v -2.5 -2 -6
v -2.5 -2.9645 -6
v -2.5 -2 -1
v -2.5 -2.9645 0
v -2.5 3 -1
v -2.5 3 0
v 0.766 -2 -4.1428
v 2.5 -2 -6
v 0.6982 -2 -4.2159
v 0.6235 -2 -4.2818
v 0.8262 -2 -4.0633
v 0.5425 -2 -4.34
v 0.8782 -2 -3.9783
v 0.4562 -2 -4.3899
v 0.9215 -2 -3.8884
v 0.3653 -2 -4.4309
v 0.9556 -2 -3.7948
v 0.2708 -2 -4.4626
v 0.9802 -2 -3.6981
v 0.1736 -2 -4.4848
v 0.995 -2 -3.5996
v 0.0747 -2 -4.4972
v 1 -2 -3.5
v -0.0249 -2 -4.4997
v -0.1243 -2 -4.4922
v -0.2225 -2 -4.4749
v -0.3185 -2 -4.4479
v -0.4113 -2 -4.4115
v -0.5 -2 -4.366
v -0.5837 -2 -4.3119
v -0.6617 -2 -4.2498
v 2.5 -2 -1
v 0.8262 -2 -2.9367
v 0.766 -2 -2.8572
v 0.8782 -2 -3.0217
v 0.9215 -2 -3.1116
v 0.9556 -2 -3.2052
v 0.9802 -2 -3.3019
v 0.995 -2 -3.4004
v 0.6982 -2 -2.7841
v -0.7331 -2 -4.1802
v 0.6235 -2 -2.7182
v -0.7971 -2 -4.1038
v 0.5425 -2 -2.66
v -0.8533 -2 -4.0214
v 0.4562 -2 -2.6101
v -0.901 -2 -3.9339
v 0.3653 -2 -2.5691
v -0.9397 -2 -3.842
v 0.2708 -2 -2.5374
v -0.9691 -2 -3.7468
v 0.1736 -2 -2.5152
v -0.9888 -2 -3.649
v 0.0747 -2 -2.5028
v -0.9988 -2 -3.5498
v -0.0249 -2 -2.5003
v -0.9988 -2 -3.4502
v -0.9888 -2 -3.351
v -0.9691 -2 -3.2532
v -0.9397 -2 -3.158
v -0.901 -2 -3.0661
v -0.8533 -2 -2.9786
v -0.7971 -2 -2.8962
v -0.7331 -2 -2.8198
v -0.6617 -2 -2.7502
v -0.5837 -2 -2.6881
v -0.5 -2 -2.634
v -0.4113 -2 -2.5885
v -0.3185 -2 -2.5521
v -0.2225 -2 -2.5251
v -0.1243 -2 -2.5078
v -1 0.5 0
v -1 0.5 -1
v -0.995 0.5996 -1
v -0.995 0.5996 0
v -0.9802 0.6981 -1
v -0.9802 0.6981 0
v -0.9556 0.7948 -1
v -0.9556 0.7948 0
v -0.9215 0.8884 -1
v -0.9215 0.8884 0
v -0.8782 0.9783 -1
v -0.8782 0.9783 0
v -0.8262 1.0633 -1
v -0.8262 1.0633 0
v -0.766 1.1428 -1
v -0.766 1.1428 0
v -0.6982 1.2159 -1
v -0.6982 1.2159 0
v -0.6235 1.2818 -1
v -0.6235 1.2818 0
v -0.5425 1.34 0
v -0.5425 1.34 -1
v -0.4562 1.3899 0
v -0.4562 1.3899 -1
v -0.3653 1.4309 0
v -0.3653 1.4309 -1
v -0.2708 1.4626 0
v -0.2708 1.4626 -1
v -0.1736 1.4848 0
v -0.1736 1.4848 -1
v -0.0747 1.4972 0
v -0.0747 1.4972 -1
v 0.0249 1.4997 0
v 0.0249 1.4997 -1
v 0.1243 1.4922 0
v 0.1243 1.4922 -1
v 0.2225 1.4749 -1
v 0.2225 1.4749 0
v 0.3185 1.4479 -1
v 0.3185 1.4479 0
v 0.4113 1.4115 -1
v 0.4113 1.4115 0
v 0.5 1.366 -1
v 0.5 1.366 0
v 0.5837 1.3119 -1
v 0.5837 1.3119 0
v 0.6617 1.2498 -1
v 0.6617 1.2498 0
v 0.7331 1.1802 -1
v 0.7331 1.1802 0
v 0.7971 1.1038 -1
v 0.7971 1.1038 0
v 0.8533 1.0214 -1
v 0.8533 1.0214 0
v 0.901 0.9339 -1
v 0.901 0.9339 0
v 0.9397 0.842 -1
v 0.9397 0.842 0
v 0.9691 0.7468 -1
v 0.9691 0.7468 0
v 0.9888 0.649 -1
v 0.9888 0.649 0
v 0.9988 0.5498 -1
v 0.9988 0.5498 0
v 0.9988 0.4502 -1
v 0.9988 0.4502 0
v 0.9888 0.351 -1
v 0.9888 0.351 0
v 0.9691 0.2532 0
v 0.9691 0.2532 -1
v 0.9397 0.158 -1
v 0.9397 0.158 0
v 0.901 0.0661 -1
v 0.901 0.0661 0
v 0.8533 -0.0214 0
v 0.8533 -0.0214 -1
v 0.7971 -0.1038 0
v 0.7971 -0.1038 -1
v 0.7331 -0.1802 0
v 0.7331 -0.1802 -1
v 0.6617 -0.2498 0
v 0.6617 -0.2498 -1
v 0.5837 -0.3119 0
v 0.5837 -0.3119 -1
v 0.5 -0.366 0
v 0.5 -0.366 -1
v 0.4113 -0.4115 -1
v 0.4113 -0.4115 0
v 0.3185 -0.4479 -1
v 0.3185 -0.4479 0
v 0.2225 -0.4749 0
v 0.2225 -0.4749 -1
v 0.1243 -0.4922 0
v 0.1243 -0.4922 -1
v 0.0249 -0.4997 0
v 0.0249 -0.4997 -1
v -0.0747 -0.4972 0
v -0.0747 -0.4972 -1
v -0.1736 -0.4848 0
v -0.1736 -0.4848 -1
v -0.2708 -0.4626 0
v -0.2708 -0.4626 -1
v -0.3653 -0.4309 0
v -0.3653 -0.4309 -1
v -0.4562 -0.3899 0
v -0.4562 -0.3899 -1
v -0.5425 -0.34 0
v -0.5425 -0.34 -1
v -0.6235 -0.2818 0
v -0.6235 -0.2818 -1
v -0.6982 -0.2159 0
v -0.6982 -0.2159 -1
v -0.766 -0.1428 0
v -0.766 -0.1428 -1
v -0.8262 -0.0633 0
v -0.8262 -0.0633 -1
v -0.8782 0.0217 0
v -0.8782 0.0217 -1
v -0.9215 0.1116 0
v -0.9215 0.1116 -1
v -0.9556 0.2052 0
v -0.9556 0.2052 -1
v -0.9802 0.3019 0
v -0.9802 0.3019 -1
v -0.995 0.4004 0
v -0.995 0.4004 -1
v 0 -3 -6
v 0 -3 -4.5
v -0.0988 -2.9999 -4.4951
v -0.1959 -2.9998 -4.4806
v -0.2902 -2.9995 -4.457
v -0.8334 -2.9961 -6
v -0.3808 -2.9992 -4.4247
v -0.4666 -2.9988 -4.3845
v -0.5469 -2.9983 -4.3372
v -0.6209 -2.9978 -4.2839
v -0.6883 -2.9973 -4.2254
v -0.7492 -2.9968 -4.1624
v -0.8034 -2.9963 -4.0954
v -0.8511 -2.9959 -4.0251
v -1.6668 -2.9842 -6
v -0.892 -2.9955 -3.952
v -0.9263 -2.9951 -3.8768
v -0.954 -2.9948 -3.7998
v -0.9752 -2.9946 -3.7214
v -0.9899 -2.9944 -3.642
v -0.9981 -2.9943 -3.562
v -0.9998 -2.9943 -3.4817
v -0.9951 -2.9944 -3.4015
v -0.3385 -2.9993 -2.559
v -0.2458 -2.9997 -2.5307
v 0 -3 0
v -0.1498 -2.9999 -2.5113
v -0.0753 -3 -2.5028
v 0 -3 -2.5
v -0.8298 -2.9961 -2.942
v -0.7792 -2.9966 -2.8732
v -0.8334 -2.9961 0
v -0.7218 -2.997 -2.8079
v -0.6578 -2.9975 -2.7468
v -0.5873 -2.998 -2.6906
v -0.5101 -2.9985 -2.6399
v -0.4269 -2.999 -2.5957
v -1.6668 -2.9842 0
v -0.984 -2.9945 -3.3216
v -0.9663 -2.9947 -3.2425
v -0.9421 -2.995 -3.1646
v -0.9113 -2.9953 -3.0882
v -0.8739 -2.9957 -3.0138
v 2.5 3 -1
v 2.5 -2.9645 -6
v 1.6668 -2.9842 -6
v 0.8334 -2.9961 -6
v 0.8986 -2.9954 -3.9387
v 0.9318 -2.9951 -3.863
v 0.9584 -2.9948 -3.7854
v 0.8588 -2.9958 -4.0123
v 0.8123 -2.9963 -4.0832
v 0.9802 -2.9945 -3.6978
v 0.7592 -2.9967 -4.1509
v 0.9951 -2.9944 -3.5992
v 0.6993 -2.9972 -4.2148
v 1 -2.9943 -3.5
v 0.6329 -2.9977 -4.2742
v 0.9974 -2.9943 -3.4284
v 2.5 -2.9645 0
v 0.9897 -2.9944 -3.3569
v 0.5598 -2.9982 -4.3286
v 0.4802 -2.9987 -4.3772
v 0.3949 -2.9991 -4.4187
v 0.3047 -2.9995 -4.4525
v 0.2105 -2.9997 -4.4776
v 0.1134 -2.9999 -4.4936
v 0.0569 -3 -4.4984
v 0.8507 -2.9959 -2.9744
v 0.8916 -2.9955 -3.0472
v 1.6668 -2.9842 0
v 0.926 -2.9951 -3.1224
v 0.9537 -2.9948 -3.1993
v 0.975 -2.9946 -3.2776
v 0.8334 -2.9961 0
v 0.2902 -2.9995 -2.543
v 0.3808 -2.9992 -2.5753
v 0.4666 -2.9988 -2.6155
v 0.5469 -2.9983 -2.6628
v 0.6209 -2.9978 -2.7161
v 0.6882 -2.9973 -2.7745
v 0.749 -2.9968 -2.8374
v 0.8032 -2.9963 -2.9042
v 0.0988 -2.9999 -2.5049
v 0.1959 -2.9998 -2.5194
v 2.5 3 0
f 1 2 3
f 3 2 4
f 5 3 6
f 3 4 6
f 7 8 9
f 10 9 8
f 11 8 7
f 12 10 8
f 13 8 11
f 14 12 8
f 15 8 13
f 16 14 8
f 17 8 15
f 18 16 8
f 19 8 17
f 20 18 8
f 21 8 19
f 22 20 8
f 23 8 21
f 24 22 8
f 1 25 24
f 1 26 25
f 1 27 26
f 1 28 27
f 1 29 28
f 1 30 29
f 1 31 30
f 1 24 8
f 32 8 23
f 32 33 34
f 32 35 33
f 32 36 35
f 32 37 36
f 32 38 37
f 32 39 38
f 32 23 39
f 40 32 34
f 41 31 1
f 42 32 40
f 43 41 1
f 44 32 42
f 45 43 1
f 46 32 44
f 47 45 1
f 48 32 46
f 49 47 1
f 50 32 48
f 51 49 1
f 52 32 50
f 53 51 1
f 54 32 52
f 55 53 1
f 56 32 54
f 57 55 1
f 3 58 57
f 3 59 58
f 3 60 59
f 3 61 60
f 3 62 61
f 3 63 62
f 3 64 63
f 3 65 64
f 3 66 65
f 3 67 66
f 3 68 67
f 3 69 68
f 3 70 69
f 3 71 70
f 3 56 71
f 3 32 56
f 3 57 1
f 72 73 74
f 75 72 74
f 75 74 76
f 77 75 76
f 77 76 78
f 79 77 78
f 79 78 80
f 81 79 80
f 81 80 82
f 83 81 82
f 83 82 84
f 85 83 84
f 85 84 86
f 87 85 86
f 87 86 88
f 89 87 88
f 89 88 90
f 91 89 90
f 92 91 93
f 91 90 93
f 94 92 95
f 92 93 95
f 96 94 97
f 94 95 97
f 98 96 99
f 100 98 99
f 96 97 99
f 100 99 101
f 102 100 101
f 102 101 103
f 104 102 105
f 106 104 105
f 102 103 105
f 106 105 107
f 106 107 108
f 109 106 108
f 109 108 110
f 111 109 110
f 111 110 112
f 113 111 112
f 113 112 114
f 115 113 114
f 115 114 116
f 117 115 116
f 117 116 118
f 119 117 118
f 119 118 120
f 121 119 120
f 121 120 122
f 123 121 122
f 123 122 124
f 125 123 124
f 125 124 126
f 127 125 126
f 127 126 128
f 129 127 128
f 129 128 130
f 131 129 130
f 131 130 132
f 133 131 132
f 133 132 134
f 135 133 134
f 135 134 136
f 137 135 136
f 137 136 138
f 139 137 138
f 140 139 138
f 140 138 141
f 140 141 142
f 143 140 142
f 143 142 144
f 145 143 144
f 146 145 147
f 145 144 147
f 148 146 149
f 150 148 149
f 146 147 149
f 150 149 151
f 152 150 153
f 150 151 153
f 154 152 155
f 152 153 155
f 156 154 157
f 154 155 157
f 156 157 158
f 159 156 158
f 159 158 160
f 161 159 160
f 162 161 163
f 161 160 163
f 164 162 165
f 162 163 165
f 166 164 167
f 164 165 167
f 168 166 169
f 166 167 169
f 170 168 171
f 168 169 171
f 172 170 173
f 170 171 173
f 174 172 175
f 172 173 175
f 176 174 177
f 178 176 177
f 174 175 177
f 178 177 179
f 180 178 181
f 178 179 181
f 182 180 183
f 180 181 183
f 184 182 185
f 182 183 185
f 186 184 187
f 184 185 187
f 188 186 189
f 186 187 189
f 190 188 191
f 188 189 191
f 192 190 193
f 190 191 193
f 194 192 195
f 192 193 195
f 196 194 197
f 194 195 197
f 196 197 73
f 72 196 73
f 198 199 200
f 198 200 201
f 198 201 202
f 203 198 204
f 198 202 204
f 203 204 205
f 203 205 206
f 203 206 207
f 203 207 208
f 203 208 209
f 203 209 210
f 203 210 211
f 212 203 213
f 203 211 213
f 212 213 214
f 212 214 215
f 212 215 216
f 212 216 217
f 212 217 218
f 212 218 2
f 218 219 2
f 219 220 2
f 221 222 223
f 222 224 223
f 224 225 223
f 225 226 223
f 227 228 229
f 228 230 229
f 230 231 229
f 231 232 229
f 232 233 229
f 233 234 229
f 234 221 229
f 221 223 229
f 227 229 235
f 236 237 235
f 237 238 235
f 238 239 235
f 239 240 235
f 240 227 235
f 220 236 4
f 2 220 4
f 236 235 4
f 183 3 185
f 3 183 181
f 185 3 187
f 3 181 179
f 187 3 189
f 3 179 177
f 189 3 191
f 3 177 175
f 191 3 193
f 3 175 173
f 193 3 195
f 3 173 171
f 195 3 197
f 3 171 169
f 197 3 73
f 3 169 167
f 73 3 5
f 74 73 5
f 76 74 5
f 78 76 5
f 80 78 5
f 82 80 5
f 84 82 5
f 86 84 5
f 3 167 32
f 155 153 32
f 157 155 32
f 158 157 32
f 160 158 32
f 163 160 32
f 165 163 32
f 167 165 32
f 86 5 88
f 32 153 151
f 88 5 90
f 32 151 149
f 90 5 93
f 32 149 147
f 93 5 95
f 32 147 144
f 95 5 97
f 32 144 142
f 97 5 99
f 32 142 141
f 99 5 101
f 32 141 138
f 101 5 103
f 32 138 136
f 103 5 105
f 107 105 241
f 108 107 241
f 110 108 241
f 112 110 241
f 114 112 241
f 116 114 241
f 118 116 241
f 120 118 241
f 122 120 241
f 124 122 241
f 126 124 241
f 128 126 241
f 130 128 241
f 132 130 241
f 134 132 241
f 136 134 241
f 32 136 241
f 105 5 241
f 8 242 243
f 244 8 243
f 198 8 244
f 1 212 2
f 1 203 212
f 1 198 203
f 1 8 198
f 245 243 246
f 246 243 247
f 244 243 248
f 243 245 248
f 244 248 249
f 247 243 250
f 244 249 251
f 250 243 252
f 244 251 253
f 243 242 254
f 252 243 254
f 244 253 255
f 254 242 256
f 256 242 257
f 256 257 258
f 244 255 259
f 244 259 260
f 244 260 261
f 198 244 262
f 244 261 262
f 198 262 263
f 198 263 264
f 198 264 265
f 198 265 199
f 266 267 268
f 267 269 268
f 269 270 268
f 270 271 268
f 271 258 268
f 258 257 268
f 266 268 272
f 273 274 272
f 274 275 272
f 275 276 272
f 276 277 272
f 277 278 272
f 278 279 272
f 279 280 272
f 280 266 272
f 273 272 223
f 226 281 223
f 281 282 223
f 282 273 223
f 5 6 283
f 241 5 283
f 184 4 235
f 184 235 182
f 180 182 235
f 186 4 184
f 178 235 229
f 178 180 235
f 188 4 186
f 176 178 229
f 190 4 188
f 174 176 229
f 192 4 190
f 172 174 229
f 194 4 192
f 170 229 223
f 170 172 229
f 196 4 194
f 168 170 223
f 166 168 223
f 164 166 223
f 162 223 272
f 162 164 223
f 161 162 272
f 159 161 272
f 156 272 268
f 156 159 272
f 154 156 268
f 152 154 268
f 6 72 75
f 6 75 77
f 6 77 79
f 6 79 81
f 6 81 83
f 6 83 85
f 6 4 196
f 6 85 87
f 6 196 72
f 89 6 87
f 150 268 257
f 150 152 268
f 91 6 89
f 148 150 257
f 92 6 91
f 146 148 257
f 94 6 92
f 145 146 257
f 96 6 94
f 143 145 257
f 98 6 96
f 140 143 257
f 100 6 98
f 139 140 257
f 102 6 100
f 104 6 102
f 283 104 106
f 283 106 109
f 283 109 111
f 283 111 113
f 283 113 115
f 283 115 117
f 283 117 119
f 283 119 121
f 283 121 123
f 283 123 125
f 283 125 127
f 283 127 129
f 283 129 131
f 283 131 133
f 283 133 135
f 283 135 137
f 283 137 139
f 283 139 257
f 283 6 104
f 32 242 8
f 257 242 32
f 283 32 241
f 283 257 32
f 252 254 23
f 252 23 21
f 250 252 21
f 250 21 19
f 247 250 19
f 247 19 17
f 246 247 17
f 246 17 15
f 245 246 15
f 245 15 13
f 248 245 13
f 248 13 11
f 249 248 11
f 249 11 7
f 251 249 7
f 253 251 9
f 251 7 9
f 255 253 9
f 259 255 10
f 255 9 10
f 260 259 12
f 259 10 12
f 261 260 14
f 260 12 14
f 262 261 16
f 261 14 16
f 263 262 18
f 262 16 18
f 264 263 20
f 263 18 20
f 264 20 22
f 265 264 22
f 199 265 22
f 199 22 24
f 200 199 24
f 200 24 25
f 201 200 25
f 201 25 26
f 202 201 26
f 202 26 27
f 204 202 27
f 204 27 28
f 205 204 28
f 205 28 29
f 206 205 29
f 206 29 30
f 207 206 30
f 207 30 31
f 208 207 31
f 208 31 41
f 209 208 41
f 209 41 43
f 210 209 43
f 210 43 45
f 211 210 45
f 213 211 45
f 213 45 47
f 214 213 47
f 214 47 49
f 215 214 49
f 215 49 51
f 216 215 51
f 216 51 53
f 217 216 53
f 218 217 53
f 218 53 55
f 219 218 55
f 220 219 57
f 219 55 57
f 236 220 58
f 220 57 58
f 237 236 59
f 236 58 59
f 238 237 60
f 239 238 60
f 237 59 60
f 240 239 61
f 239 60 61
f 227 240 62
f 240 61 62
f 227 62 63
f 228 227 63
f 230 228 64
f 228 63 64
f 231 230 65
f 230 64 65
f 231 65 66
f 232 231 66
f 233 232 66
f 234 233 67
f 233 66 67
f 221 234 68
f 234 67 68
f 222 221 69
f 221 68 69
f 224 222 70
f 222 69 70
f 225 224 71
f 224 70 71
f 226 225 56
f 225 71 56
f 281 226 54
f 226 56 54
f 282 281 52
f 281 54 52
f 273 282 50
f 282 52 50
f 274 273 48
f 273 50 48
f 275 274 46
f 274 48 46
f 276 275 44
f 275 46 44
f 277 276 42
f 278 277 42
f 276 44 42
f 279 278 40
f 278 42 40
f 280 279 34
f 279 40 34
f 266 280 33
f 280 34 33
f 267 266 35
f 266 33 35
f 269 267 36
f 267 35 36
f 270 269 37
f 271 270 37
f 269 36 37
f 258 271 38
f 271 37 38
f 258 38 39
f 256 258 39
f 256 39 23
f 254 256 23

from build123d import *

# Parameters (mm, degrees)
ESBO_O1_W                = 5
ESBO_O1_H                = 6
RESSALTO_EXTRUS_O1_DEPTH = 1
ESBO_O2_W                = 5
ESBO_O2_H                = 1
RESSALTO_EXTRUS_O2_DEPTH = 5
CORTE_EXTRUS_O1_REACH    = 8
CORTE_EXTRUS_O2_REACH    = 3
ESBO_O4_R                = 1
CORTE_EXTRUS_O3_REACH    = 3
ESBO_O5_R                = 1


with BuildPart() as part:
    # Esboço1 → Ressalto-extrusão1 (new body)
    with BuildSketch(Plane.XY):
        Rectangle(ESBO_O1_W, ESBO_O1_H)
    extrude(amount=-RESSALTO_EXTRUS_O1_DEPTH)

    # Esboço2 → Ressalto-extrusão2 (add)
    with BuildSketch(Plane(origin=(0, 0, -1), x_dir=(-1, 0, 0), z_dir=(0, 0, -1))):
        with Locations((0, -2.5)):
            Rectangle(ESBO_O2_W, ESBO_O2_H)
    extrude(amount=RESSALTO_EXTRUS_O2_DEPTH)

    # Esboço3 → Corte-extrusão1 (cut, up to next)
    with BuildSketch(Plane.XY, mode=Mode.PRIVATE) as corte_extrus_o1_sk1:
        with BuildLine():
            ThreePointArc((3.35e-07, -3), (-1.250125983, -2.991119921), (-2.5, -2.964481468))
            Line((-2.5, -2.964481468), (-2.5, -3))
            Line((-2.5, -3), (3.35e-07, -3))
        make_face()
    corte_extrus_o1_tool1 = extrude(corte_extrus_o1_sk1.sketch, amount=-CORTE_EXTRUS_O1_REACH, mode=Mode.PRIVATE) & part.part
    add(corte_extrus_o1_tool1.solids().sort_by_distance((-1.875025, -2.989345, 0))[0], mode=Mode.SUBTRACT)
    # Esboço3 → Corte-extrusão1 (cut, up to next)
    with BuildSketch(Plane.XY, mode=Mode.PRIVATE) as corte_extrus_o1_sk2:
        with BuildLine():
            Line((2.5, -3), (2.5, -2.964481468))
            ThreePointArc((2.5, -2.964481468), (1.250126318, -2.991119917), (3.35e-07, -3))
            Line((3.35e-07, -3), (2.5, -3))
        make_face()
    corte_extrus_o1_tool2 = extrude(corte_extrus_o1_sk2.sketch, amount=-CORTE_EXTRUS_O1_REACH, mode=Mode.PRIVATE) & part.part
    add(corte_extrus_o1_tool2.solids().sort_by_distance((1.875025, -2.989345, 0))[0], mode=Mode.SUBTRACT)

    # Esboço4 → Corte-extrusão2 (cut, up to next)
    with BuildSketch(Plane(origin=(0, -2, 0), x_dir=(1, 0, 0), z_dir=(0, 1, 0)), mode=Mode.PRIVATE) as corte_extrus_o2_sk1:
        with Locations((0, 3.5)):
            Circle(ESBO_O4_R)
    corte_extrus_o2_tool1 = extrude(corte_extrus_o2_sk1.sketch, amount=-CORTE_EXTRUS_O2_REACH, mode=Mode.PRIVATE) & part.part
    add(corte_extrus_o2_tool1.solids().sort_by_distance((0, -2, -3.5))[0], mode=Mode.SUBTRACT)

    # Esboço5 → Corte-extrusão3 (cut, up to next)
    with BuildSketch(Plane(origin=(0, 0, -1), x_dir=(-1, 0, 0), z_dir=(0, 0, -1)), mode=Mode.PRIVATE) as corte_extrus_o3_sk1:
        with Locations((0, 0.5)):
            Circle(ESBO_O5_R)
    corte_extrus_o3_tool1 = extrude(corte_extrus_o3_sk1.sketch, amount=-CORTE_EXTRUS_O3_REACH, mode=Mode.PRIVATE) & part.part
    add(corte_extrus_o3_tool1.solids().sort_by_distance((0, 0.5, -1))[0], mode=Mode.SUBTRACT)


solid = part.part
